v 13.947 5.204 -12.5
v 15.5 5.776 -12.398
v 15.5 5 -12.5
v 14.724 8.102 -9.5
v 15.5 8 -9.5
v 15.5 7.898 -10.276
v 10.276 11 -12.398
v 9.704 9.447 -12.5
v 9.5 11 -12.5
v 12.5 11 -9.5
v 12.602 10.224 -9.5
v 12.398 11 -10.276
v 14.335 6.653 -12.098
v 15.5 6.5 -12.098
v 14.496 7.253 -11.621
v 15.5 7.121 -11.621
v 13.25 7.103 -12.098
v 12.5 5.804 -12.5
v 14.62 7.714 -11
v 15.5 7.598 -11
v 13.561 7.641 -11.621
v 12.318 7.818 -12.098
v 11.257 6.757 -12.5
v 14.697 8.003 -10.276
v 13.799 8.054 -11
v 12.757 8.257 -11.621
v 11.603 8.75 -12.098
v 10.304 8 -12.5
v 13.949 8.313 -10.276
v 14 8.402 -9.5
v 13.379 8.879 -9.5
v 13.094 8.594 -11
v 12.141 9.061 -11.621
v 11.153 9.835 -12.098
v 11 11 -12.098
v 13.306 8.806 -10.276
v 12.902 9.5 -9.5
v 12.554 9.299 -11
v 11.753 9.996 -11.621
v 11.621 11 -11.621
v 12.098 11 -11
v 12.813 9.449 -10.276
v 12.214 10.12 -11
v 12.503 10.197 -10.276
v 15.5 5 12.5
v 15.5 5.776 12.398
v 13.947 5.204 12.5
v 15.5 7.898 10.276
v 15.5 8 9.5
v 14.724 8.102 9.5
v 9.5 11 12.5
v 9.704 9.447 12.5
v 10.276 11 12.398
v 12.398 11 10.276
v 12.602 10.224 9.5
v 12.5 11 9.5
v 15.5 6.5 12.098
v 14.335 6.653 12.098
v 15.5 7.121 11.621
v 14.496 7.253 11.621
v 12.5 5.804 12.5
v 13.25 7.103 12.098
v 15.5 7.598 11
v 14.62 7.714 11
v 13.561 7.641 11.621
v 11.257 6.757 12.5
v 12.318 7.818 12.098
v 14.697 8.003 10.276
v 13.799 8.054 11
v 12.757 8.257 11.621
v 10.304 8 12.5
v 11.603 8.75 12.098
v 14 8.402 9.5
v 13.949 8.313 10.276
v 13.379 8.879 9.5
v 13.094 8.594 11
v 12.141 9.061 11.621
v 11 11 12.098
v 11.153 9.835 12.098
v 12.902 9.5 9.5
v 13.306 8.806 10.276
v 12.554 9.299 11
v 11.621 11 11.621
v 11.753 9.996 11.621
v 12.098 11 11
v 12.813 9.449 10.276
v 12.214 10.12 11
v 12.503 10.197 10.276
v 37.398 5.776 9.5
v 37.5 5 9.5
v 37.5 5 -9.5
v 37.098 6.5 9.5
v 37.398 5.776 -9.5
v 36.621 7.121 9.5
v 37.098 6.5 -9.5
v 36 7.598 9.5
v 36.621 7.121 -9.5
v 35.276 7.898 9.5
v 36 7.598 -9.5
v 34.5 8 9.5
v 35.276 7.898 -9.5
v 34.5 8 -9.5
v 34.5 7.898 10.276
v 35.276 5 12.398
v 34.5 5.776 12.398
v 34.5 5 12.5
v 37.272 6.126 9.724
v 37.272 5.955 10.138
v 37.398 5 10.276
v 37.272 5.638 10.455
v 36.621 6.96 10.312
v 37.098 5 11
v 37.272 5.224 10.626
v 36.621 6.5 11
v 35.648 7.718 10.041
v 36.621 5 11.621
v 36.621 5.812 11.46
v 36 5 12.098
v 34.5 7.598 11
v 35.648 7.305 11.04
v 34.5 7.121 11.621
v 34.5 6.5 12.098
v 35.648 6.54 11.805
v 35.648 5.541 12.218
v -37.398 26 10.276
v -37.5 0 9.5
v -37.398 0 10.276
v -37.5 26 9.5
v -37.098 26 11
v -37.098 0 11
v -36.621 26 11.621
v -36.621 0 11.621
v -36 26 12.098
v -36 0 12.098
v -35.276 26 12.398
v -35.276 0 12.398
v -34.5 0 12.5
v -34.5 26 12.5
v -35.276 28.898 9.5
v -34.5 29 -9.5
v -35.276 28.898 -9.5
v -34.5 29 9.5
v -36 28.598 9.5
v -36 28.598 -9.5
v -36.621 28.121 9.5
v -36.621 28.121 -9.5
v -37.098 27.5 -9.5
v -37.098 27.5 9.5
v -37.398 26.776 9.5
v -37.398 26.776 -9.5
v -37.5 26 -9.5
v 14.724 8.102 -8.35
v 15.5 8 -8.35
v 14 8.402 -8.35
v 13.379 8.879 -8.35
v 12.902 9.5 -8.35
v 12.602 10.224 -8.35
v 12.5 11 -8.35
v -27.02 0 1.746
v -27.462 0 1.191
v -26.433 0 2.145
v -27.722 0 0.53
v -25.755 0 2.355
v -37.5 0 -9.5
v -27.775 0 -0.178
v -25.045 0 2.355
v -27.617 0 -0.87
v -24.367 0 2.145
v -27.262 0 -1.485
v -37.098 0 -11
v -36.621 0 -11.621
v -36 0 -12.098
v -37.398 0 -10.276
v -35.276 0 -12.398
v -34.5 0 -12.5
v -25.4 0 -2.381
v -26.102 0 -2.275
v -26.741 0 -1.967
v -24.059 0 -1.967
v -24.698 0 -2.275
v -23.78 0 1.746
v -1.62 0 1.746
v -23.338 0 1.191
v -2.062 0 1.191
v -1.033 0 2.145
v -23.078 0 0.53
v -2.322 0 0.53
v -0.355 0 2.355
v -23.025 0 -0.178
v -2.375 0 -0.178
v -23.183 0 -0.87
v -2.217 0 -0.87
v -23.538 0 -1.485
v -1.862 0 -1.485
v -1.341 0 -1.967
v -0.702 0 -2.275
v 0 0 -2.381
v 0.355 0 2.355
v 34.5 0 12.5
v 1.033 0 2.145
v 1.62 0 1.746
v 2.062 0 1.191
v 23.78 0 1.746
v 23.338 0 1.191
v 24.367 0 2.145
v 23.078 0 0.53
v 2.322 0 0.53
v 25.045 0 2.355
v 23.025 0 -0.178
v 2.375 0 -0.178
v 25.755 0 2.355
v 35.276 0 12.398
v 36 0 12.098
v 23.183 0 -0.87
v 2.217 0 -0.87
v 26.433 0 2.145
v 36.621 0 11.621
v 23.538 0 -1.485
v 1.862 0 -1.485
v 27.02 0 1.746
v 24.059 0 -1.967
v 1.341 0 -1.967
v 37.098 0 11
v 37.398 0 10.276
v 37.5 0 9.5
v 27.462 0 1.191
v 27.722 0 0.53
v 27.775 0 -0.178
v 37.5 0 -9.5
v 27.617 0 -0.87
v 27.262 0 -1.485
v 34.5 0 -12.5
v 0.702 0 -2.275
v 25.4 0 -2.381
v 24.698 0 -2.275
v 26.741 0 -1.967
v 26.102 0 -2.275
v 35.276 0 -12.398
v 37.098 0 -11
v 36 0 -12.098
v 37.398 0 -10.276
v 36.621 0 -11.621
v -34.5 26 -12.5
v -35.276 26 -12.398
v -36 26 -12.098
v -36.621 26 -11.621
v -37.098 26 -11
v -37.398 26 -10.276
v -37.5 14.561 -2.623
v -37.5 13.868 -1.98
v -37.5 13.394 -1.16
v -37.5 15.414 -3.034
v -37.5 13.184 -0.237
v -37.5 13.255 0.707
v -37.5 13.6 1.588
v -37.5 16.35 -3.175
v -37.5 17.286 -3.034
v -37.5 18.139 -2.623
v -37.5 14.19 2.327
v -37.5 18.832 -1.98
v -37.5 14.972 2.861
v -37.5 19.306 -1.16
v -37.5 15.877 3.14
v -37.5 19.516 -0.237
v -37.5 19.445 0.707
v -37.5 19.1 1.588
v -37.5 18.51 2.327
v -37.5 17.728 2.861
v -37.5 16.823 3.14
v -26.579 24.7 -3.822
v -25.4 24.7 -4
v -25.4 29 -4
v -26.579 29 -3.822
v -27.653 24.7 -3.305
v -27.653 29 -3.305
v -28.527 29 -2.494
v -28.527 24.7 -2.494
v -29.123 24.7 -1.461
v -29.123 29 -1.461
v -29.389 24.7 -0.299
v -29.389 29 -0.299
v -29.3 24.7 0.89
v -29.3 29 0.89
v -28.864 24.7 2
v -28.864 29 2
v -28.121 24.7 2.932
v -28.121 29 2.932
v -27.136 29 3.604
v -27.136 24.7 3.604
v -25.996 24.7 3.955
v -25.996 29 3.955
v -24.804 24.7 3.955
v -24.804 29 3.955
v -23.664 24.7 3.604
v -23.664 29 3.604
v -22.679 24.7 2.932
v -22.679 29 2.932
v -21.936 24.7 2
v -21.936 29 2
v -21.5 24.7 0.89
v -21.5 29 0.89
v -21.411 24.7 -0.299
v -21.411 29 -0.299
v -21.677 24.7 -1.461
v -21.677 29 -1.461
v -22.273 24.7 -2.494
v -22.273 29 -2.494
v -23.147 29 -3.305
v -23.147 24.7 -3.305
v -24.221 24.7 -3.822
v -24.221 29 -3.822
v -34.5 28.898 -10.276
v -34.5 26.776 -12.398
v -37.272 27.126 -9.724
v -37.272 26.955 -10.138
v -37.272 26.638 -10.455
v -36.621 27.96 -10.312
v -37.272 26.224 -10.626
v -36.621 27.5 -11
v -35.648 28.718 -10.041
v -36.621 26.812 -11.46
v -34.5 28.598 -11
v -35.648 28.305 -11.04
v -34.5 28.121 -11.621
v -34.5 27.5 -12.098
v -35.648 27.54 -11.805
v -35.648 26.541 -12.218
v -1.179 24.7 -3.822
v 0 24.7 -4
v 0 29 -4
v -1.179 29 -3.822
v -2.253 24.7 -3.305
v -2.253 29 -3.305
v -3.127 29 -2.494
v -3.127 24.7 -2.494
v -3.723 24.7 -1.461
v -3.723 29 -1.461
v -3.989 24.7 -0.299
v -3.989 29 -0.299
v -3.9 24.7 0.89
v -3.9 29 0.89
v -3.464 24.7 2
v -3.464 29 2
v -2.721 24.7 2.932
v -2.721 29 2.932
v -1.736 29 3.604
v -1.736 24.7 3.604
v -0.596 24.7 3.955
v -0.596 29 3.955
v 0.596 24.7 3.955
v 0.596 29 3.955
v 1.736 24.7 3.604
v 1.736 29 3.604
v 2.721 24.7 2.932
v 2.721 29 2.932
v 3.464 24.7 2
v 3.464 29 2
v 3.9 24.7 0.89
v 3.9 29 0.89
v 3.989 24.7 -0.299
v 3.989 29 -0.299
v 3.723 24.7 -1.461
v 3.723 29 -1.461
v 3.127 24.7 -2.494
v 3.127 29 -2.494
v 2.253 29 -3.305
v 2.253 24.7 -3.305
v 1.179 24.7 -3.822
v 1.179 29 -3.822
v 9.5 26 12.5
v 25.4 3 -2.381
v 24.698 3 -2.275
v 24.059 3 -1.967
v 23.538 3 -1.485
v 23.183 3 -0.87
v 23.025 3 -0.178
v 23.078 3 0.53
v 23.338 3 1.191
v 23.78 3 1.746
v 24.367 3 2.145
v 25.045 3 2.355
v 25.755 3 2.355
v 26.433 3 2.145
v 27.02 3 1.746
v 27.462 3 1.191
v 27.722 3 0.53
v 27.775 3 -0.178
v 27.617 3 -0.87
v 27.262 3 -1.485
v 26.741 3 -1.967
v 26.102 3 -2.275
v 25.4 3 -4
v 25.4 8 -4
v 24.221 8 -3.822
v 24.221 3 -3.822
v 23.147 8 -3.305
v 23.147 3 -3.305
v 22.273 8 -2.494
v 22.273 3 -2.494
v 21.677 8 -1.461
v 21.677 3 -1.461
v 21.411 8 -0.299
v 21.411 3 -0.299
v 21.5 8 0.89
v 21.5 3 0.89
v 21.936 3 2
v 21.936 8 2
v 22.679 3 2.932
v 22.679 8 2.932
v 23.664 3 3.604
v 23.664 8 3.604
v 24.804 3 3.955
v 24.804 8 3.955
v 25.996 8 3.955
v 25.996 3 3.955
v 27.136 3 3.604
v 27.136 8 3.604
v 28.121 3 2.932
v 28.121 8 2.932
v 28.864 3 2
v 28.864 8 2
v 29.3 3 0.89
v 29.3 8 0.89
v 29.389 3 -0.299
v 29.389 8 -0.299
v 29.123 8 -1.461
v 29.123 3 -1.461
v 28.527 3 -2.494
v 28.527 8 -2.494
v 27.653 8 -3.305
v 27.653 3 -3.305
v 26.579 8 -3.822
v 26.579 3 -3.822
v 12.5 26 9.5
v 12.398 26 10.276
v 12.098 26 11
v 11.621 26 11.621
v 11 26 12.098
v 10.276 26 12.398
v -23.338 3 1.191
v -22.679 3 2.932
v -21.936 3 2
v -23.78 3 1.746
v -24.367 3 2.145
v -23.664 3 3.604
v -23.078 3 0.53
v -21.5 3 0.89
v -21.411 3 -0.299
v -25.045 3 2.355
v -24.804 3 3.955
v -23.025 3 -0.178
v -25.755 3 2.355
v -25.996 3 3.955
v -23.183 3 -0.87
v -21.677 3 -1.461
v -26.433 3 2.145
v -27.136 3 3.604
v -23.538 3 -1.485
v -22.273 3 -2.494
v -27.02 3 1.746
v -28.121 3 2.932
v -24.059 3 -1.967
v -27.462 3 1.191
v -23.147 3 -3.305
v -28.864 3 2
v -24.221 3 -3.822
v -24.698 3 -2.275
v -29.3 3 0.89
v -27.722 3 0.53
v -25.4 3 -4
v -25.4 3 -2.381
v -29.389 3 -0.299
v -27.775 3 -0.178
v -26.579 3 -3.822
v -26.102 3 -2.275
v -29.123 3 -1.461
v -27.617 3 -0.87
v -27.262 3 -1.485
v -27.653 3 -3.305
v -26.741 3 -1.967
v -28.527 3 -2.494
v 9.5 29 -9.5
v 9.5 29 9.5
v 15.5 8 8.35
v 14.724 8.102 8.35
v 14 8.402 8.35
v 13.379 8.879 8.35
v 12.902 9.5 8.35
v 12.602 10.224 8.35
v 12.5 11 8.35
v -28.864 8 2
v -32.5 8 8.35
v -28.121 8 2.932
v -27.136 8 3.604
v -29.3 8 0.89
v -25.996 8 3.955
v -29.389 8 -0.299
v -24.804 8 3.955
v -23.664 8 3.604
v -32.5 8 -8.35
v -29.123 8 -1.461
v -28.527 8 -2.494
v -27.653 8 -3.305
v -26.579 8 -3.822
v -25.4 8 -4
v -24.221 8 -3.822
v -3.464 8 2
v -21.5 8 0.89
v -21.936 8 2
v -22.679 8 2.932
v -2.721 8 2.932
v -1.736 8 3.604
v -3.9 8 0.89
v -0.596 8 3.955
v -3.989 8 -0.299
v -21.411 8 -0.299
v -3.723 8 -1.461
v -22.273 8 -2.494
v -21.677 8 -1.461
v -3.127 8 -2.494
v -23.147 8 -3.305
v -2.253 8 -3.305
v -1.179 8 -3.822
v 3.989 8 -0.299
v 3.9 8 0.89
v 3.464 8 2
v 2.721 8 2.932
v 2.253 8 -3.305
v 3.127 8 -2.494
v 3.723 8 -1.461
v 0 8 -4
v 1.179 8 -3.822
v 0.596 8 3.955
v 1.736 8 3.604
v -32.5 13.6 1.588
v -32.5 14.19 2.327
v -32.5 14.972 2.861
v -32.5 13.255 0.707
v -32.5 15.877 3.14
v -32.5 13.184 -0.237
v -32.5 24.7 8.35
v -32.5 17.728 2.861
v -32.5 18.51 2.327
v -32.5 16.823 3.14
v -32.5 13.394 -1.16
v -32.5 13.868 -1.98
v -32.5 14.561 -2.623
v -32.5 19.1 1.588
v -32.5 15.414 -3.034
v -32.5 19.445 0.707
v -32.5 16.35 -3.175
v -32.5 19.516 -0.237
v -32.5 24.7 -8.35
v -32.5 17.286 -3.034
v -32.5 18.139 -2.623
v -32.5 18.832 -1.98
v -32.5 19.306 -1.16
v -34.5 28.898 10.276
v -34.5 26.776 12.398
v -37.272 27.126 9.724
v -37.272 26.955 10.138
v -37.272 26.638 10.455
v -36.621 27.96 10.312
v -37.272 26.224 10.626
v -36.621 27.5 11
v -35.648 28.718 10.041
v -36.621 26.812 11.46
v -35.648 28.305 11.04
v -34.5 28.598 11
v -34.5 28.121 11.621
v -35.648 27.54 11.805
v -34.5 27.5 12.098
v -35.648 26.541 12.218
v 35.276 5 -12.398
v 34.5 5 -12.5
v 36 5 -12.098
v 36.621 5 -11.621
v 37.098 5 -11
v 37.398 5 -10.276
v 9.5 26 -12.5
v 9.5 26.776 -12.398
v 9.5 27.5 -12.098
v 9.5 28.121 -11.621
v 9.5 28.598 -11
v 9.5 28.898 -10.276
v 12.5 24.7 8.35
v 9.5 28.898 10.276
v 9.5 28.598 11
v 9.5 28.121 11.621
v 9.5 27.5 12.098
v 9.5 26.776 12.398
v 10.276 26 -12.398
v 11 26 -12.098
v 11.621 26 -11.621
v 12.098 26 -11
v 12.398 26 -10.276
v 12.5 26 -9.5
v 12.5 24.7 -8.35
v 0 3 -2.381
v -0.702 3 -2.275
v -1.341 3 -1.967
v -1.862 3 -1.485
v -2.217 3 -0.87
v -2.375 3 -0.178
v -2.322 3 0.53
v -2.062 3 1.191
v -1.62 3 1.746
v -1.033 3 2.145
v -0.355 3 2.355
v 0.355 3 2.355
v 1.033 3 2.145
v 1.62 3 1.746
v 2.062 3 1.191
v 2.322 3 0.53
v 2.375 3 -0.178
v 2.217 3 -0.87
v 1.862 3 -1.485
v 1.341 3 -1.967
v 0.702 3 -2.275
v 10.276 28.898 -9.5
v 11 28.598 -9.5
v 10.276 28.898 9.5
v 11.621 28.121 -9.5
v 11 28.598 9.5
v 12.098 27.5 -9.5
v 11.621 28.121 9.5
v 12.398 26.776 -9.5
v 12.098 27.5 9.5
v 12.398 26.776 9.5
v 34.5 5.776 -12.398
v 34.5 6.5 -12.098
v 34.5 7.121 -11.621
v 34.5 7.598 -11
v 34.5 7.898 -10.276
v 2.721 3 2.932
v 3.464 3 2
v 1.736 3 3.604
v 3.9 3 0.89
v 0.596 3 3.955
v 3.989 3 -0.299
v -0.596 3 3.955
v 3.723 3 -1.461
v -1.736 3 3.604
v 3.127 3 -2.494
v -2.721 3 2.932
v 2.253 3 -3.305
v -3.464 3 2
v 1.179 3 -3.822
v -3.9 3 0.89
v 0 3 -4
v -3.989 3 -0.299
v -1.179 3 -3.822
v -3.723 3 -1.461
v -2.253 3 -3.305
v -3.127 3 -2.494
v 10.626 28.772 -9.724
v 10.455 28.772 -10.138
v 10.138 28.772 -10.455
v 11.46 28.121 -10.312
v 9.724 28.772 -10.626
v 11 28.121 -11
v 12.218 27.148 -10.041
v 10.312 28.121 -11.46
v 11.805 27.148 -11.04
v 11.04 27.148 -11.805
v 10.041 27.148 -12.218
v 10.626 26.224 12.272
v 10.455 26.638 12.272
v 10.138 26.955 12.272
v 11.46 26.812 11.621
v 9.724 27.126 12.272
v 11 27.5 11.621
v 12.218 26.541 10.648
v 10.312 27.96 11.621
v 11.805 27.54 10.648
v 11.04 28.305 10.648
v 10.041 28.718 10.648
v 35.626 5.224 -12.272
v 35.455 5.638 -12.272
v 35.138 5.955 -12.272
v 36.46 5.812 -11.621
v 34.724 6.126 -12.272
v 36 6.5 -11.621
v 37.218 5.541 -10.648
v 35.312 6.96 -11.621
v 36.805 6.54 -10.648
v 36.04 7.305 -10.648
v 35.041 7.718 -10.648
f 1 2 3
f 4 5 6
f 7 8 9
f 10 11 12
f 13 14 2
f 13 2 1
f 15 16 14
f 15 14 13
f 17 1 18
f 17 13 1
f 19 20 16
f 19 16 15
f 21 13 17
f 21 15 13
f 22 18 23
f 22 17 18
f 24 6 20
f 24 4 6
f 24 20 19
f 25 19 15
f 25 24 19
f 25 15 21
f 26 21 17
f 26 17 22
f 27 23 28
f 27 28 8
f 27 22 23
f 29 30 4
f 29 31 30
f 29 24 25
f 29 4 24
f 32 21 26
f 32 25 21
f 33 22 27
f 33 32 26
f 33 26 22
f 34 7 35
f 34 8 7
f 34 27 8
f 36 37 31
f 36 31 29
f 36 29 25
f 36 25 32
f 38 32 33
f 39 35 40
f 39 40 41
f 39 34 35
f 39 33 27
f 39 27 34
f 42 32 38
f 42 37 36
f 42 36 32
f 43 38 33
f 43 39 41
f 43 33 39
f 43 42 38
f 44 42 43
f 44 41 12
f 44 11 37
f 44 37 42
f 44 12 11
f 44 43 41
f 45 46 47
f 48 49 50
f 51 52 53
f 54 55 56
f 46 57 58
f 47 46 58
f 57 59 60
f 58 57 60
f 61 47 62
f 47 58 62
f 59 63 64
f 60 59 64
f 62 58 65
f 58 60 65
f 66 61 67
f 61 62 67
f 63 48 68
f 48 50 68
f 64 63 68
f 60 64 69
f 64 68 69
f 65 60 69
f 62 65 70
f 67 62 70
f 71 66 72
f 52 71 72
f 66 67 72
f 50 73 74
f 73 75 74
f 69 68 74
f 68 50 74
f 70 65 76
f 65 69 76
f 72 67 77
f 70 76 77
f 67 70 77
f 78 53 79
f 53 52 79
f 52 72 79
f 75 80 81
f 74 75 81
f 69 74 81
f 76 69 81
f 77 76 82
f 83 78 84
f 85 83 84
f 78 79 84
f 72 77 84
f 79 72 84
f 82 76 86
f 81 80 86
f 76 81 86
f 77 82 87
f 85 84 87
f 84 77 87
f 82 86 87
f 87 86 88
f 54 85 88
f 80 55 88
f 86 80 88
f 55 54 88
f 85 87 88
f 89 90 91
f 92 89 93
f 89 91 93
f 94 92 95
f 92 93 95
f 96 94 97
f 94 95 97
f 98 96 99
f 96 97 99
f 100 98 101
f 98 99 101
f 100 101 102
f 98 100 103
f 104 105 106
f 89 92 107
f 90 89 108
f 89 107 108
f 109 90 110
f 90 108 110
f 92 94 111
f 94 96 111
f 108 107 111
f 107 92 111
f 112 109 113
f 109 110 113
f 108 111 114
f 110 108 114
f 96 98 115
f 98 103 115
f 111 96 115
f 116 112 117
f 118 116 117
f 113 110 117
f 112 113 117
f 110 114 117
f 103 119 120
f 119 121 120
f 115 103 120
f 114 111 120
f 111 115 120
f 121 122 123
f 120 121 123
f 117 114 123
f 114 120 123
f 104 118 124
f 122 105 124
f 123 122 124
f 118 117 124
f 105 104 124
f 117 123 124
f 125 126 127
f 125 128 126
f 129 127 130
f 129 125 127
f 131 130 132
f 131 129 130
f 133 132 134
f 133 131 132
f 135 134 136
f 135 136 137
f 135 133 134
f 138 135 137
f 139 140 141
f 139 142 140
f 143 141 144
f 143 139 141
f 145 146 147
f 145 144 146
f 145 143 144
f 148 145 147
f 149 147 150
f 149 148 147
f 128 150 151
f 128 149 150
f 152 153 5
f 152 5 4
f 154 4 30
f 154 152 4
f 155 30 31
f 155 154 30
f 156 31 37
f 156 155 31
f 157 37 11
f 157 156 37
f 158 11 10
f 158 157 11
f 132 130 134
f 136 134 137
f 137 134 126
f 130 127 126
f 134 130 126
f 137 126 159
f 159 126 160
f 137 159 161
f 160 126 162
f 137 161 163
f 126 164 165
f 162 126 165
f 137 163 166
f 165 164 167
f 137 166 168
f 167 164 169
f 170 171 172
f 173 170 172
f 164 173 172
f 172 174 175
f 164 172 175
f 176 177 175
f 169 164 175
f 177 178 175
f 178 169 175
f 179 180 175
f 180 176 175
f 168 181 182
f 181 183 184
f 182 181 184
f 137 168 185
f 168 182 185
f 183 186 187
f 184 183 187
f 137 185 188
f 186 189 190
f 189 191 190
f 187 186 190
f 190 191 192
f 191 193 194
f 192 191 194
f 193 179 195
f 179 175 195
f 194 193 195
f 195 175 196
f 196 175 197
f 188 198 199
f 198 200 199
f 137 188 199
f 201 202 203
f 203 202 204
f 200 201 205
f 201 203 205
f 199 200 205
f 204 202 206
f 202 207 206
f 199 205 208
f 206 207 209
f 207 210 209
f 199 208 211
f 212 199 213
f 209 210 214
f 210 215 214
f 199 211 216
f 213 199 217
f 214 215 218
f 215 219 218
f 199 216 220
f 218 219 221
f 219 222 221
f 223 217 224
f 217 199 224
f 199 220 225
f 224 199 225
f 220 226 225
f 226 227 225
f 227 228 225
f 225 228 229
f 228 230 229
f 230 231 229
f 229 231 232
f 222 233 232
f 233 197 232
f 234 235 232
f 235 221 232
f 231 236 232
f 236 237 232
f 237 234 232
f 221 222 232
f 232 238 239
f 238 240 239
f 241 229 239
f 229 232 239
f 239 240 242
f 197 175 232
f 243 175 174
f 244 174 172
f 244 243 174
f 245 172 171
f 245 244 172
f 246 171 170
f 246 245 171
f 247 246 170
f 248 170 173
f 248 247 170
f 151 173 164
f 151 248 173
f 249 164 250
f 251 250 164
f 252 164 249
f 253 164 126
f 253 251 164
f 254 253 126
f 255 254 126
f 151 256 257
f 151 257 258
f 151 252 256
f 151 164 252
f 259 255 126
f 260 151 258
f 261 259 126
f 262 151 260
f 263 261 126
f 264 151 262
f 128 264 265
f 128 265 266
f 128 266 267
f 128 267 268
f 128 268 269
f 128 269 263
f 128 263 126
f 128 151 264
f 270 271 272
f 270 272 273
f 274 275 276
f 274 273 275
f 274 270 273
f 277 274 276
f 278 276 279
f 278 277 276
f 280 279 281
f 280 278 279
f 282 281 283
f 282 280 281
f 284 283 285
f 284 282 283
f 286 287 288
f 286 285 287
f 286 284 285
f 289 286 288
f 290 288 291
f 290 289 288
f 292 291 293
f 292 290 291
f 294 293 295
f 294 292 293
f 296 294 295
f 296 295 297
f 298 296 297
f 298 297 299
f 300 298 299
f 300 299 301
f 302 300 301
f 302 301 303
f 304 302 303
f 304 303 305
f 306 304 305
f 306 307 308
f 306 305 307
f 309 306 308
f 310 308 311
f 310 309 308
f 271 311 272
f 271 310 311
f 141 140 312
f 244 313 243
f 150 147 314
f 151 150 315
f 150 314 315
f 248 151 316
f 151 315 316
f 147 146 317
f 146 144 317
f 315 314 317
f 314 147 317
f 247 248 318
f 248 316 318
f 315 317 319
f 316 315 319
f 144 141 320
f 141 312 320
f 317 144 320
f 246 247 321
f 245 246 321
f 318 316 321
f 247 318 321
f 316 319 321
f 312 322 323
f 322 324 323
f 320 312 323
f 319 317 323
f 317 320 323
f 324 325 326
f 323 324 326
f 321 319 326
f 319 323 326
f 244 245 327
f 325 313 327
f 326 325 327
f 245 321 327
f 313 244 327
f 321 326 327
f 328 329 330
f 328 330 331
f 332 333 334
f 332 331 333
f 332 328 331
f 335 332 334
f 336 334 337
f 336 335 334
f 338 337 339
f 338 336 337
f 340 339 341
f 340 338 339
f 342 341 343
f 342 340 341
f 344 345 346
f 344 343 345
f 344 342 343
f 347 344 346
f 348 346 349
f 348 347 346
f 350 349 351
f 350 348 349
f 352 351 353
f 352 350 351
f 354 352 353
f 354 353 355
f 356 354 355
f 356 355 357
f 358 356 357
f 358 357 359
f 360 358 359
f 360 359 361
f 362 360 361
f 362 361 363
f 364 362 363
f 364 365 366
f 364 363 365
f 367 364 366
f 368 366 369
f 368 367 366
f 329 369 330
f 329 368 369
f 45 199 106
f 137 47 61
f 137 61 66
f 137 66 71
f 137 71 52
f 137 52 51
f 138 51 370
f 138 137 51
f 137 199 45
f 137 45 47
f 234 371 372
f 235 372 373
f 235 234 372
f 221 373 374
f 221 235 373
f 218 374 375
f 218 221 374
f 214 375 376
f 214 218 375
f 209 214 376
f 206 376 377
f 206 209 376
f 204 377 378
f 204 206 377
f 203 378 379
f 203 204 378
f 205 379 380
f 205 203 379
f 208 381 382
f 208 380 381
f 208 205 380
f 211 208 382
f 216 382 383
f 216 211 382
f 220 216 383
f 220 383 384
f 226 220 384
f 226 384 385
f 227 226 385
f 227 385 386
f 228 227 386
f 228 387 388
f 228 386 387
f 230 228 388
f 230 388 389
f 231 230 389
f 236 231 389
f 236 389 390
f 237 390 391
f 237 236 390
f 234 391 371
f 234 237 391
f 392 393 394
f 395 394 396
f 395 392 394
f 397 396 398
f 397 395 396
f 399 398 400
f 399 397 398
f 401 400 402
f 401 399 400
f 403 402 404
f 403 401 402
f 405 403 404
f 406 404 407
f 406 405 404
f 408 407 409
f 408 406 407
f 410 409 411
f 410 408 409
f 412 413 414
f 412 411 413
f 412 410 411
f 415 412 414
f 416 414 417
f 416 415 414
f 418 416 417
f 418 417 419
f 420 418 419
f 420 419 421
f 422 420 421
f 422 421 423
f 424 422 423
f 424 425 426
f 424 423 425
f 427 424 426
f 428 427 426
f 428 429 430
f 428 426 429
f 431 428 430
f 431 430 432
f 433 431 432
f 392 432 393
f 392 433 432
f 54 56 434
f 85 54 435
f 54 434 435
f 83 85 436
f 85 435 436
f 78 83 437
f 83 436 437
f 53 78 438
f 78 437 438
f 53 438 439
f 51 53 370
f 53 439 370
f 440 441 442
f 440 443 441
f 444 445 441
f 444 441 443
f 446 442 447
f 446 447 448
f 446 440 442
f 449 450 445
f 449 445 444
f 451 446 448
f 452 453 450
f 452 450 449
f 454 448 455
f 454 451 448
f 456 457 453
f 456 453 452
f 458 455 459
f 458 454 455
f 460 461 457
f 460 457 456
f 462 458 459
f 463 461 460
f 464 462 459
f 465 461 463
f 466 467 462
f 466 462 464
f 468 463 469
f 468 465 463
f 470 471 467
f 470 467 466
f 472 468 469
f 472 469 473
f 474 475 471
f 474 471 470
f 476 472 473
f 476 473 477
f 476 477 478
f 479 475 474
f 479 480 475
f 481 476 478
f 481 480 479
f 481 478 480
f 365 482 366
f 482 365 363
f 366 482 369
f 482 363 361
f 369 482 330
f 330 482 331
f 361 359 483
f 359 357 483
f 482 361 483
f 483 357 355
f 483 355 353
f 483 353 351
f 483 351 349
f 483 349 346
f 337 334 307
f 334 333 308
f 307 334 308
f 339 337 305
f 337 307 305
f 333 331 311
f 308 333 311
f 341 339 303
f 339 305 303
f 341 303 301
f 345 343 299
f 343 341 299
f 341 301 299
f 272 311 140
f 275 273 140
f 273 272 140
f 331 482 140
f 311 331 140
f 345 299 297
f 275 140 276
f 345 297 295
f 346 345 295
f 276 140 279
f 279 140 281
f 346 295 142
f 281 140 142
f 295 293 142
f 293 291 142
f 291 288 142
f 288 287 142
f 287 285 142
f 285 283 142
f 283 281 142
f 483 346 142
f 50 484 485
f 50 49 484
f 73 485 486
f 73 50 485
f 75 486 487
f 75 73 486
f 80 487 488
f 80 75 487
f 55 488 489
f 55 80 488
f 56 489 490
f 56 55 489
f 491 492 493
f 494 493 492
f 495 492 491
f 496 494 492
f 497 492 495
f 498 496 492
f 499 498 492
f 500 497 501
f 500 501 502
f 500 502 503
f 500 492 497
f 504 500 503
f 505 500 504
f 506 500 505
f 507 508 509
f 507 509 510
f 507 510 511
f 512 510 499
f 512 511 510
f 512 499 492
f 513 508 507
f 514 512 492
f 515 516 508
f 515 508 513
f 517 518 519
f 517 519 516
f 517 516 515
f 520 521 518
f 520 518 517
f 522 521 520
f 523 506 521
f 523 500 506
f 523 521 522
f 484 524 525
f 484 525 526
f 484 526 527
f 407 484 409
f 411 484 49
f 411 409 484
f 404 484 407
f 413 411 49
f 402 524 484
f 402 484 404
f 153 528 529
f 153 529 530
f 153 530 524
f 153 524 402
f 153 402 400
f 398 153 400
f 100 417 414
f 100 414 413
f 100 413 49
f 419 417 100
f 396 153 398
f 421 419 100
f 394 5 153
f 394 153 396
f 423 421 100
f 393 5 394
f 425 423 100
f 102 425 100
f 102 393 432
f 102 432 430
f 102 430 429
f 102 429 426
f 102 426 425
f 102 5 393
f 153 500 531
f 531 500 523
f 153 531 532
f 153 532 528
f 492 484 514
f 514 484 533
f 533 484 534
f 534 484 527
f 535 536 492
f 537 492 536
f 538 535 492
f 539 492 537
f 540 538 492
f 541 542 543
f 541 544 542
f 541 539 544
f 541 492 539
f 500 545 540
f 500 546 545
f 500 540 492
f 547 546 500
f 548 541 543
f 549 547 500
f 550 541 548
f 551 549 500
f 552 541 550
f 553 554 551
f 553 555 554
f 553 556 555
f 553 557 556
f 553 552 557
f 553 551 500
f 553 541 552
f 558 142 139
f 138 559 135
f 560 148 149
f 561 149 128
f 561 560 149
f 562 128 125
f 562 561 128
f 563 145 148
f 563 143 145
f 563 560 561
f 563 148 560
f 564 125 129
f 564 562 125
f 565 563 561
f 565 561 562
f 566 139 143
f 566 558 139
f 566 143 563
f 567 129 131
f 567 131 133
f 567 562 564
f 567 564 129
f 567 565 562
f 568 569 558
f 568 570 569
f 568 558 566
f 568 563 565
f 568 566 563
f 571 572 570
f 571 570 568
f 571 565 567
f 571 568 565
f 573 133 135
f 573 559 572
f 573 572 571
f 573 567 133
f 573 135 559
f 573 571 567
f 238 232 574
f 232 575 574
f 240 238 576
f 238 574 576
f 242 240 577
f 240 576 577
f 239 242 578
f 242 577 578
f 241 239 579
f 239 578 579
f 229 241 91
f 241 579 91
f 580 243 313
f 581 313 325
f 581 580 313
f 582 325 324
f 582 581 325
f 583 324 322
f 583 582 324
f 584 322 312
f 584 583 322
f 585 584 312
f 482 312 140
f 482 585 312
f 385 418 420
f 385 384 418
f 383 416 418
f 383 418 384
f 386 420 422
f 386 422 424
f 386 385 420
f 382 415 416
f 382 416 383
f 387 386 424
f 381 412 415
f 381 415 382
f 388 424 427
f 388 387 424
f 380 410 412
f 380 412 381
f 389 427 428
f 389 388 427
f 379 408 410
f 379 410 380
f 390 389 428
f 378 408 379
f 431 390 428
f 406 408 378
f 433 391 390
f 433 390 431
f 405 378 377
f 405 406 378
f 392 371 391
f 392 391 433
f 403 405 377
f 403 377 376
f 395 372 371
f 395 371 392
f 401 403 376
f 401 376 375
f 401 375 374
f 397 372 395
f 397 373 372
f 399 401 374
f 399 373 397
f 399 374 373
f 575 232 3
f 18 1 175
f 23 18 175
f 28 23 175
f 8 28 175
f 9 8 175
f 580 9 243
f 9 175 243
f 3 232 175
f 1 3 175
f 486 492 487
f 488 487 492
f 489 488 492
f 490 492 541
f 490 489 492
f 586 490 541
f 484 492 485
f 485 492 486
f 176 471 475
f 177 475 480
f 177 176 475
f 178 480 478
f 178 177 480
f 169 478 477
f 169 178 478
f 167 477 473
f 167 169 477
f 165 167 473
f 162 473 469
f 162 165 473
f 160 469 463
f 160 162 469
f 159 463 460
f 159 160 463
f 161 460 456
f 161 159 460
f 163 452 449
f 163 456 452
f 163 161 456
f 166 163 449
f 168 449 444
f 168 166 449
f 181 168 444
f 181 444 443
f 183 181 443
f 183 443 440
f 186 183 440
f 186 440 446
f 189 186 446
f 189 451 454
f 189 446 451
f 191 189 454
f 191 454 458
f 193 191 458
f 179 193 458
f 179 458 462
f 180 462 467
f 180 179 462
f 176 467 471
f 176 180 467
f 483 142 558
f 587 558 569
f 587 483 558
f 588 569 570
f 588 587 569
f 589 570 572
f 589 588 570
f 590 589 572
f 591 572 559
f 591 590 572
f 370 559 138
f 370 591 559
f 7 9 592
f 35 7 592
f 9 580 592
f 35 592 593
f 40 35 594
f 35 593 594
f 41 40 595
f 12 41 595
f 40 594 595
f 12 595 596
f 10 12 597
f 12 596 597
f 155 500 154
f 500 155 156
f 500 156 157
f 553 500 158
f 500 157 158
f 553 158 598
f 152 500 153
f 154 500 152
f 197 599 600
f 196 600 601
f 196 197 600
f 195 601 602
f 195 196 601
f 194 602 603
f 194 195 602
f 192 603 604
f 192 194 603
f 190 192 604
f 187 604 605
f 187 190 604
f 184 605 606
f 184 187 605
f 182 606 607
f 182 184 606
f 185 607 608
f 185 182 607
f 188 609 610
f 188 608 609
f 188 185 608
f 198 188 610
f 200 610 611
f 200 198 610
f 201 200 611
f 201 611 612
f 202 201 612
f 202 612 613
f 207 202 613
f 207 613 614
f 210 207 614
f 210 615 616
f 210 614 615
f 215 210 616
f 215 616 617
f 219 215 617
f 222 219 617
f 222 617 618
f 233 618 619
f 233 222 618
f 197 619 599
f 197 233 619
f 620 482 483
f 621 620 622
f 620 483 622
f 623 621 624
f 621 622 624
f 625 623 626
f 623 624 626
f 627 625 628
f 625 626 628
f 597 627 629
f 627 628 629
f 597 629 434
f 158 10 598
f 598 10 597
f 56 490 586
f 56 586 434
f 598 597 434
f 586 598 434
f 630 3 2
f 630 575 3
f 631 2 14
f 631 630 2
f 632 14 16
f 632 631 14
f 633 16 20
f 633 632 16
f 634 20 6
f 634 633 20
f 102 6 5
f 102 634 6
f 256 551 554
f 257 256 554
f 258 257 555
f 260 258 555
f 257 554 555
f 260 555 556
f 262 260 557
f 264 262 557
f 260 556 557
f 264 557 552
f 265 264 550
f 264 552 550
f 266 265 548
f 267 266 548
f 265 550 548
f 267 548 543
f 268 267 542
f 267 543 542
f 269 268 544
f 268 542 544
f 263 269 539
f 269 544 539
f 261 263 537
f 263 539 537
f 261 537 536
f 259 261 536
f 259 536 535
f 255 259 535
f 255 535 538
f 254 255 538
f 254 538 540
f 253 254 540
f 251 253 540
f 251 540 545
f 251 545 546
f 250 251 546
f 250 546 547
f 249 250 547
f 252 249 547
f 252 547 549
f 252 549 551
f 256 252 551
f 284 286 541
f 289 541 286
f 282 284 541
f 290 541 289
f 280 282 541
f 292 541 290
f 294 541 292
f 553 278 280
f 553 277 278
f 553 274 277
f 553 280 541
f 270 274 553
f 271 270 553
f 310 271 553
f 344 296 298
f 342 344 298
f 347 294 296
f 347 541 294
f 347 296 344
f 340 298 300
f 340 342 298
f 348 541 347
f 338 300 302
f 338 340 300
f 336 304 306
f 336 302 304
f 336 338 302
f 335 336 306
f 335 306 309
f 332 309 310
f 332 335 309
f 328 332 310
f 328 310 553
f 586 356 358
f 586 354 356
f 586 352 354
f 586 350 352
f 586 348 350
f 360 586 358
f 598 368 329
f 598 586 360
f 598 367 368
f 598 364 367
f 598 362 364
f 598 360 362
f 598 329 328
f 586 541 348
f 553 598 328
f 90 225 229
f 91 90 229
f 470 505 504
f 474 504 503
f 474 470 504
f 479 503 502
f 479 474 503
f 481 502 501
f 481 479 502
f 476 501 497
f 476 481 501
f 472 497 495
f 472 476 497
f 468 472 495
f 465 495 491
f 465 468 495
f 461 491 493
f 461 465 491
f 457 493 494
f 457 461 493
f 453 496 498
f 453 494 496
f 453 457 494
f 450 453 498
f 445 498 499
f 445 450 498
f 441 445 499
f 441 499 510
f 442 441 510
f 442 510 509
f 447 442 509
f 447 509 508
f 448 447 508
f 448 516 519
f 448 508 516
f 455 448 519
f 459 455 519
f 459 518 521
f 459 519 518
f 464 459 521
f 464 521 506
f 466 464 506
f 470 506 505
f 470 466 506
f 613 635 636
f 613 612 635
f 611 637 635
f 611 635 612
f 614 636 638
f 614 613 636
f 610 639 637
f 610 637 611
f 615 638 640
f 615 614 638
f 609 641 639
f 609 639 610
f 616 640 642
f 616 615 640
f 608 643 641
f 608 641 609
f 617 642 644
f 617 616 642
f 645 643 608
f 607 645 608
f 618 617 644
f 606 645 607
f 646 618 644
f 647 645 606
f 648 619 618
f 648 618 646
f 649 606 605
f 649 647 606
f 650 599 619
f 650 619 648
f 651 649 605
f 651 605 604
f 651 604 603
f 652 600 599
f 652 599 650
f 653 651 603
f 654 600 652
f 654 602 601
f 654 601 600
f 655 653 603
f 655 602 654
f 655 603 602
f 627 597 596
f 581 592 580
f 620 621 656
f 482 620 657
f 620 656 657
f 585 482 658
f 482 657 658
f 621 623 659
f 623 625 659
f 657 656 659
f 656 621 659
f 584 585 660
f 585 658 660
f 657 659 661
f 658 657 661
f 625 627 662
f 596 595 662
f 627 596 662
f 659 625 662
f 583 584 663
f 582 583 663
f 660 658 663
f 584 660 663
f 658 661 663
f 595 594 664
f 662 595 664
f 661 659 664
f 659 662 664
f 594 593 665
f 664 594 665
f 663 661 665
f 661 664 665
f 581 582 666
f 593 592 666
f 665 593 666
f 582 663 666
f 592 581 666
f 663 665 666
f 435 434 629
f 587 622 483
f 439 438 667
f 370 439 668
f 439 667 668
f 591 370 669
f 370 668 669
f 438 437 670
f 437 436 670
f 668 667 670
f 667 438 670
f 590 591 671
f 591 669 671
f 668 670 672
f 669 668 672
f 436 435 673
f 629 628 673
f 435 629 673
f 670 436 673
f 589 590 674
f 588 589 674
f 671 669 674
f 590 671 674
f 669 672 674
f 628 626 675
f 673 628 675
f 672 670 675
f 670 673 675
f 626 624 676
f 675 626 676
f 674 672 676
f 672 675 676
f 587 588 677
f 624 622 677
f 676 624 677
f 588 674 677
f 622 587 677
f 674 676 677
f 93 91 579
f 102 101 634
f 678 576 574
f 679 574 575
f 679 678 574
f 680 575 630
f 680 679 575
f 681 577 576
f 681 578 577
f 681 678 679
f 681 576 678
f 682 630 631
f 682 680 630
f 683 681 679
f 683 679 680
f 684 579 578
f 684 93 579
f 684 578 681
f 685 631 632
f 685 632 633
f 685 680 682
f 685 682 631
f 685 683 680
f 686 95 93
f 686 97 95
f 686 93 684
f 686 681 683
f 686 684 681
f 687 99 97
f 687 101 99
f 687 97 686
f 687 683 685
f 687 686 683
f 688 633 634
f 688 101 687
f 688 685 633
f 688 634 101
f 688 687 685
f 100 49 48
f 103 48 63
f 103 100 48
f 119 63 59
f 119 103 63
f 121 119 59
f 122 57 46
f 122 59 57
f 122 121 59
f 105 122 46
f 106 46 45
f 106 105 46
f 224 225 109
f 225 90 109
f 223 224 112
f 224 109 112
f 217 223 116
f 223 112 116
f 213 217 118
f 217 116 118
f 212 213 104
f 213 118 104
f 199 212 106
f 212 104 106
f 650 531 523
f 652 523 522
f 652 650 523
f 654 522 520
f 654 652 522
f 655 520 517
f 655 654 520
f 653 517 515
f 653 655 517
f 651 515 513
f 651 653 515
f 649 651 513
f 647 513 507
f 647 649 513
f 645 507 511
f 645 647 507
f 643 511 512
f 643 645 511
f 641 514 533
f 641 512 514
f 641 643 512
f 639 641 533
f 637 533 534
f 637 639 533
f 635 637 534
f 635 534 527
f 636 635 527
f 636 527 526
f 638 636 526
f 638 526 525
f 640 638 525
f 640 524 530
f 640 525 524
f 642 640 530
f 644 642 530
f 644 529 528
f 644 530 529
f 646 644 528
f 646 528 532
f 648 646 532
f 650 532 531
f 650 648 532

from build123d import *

# Parameters (mm, degrees)
SKETCH1_W               = 75
SKETCH1_H               = 25
BOSS_EXTRUDE1_DEPTH     = 8
SKETCH5_W               = 25
SKETCH5_H               = 21
BOSS_EXTRUDE2_DEPTH     = 50
SKETCH7_W               = 16.7
SKETCH7_H               = 16.7
CUT_EXTRUDE3_DEPTH      = 45
SKETCH4_R               = 2.38125
CUT_EXTRUDE2_DEPTH      = 50.025503567
CUT_EXTRUDE1_DEPTH      = 45.760473635
CUT_EXTRUDE1_DEPTH_BACK = 5
SKETCH3_R               = 4
FILLET1_R               = 3
SKETCH8_R               = 3.175
CUT_EXTRUDE4_DEPTH      = 77.793554417


with BuildPart() as part:
    # Sketch1 → Boss-Extrude1 (new body)
    with BuildSketch(Plane(origin=(0, 0, 0), x_dir=(1, 0, 0), z_dir=(0, 1, 0))):
        Rectangle(SKETCH1_W, SKETCH1_H)
    extrude(amount=BOSS_EXTRUDE1_DEPTH)

    # Sketch5 → Boss-Extrude2 (add)
    with BuildSketch(Plane.ZY.offset(37.5)):
        with Locations((0, 18.5)):
            Rectangle(SKETCH5_W, SKETCH5_H)
    extrude(amount=-BOSS_EXTRUDE2_DEPTH)

    # Sketch7 → Cut-Extrude3 (cut)
    with BuildSketch(Plane(origin=(12.5, 0, 0), x_dir=(0, 0, -1), z_dir=(1, 0, 0))):
        with Locations((0, 16.35)):
            Rectangle(SKETCH7_W, SKETCH7_H)
    extrude(amount=-CUT_EXTRUDE3_DEPTH, mode=Mode.SUBTRACT)

    # Sketch4 → Cut-Extrude2 (cut, through all)
    with BuildSketch(Plane(origin=(0, 0, 0), x_dir=(1, 0, 0), z_dir=(0, 1, 0))):
        with Locations(Location((0, 0, 0), (0, 0, 90))):
            Circle(SKETCH4_R)
        with Locations(Location((25.4, 0, 0), (0, 0, 90))):
            Circle(SKETCH4_R)
        with Locations(Location((-25.4, 0, 0), (0, 0, 90))):
            Circle(SKETCH4_R)
    extrude(amount=CUT_EXTRUDE2_DEPTH, mode=Mode.SUBTRACT)

    # Sketch3 → Cut-Extrude1 (cut, two sides: drawn at the far end of the back side and taken through both)
    with BuildSketch(Plane(origin=(0, 8, 0), x_dir=(1, 0, 0), z_dir=(0, 1, 0)).offset(-CUT_EXTRUDE1_DEPTH_BACK)):
        with Locations(Location((0, 0, 0), (0, 0, 90))):
            Circle(SKETCH3_R)
        with Locations(Location((25.4, 0, 0), (0, 0, 90))):
            Circle(SKETCH3_R)
        with Locations(Location((-25.4, 0, 0), (0, 0, 90))):
            Circle(SKETCH3_R)
    extrude(amount=CUT_EXTRUDE1_DEPTH + CUT_EXTRUDE1_DEPTH_BACK, mode=Mode.SUBTRACT)

    # Fillet1
    fillet1_edges = [part.edges().sort_by_distance(p)[0] for p in [
        (25, 8, 12.5),
        (12.5, 18.5, -12.5),
        (12.5, 29, 0),
        (-12.5, 29, -12.5),
        (12.5, 18.5, 12.5),
        (-12.5, 29, 12.5),
        (12.5, 8, -10.425),
        (-37.5, 29, 0),
        (12.5, 8, 10.425),
        (37.5, 8, 0),
        (37.5, 4, 12.5),
        (-37.5, 14.5, 12.5),
        (-37.5, 14.5, -12.5),
        (37.5, 4, -12.5),
        (25, 8, -12.5),
    ]]
    fillet(fillet1_edges, radius=FILLET1_R)

    # Sketch8 → Cut-Extrude4 (cut, through all)
    with BuildSketch(Plane(origin=(-32.5, 0, 0), x_dir=(0, 0, -1), z_dir=(1, 0, 0))):
        with Locations((0, 16.35)):
            Circle(SKETCH8_R)
    extrude(amount=-CUT_EXTRUDE4_DEPTH, mode=Mode.SUBTRACT)


solid = part.part
